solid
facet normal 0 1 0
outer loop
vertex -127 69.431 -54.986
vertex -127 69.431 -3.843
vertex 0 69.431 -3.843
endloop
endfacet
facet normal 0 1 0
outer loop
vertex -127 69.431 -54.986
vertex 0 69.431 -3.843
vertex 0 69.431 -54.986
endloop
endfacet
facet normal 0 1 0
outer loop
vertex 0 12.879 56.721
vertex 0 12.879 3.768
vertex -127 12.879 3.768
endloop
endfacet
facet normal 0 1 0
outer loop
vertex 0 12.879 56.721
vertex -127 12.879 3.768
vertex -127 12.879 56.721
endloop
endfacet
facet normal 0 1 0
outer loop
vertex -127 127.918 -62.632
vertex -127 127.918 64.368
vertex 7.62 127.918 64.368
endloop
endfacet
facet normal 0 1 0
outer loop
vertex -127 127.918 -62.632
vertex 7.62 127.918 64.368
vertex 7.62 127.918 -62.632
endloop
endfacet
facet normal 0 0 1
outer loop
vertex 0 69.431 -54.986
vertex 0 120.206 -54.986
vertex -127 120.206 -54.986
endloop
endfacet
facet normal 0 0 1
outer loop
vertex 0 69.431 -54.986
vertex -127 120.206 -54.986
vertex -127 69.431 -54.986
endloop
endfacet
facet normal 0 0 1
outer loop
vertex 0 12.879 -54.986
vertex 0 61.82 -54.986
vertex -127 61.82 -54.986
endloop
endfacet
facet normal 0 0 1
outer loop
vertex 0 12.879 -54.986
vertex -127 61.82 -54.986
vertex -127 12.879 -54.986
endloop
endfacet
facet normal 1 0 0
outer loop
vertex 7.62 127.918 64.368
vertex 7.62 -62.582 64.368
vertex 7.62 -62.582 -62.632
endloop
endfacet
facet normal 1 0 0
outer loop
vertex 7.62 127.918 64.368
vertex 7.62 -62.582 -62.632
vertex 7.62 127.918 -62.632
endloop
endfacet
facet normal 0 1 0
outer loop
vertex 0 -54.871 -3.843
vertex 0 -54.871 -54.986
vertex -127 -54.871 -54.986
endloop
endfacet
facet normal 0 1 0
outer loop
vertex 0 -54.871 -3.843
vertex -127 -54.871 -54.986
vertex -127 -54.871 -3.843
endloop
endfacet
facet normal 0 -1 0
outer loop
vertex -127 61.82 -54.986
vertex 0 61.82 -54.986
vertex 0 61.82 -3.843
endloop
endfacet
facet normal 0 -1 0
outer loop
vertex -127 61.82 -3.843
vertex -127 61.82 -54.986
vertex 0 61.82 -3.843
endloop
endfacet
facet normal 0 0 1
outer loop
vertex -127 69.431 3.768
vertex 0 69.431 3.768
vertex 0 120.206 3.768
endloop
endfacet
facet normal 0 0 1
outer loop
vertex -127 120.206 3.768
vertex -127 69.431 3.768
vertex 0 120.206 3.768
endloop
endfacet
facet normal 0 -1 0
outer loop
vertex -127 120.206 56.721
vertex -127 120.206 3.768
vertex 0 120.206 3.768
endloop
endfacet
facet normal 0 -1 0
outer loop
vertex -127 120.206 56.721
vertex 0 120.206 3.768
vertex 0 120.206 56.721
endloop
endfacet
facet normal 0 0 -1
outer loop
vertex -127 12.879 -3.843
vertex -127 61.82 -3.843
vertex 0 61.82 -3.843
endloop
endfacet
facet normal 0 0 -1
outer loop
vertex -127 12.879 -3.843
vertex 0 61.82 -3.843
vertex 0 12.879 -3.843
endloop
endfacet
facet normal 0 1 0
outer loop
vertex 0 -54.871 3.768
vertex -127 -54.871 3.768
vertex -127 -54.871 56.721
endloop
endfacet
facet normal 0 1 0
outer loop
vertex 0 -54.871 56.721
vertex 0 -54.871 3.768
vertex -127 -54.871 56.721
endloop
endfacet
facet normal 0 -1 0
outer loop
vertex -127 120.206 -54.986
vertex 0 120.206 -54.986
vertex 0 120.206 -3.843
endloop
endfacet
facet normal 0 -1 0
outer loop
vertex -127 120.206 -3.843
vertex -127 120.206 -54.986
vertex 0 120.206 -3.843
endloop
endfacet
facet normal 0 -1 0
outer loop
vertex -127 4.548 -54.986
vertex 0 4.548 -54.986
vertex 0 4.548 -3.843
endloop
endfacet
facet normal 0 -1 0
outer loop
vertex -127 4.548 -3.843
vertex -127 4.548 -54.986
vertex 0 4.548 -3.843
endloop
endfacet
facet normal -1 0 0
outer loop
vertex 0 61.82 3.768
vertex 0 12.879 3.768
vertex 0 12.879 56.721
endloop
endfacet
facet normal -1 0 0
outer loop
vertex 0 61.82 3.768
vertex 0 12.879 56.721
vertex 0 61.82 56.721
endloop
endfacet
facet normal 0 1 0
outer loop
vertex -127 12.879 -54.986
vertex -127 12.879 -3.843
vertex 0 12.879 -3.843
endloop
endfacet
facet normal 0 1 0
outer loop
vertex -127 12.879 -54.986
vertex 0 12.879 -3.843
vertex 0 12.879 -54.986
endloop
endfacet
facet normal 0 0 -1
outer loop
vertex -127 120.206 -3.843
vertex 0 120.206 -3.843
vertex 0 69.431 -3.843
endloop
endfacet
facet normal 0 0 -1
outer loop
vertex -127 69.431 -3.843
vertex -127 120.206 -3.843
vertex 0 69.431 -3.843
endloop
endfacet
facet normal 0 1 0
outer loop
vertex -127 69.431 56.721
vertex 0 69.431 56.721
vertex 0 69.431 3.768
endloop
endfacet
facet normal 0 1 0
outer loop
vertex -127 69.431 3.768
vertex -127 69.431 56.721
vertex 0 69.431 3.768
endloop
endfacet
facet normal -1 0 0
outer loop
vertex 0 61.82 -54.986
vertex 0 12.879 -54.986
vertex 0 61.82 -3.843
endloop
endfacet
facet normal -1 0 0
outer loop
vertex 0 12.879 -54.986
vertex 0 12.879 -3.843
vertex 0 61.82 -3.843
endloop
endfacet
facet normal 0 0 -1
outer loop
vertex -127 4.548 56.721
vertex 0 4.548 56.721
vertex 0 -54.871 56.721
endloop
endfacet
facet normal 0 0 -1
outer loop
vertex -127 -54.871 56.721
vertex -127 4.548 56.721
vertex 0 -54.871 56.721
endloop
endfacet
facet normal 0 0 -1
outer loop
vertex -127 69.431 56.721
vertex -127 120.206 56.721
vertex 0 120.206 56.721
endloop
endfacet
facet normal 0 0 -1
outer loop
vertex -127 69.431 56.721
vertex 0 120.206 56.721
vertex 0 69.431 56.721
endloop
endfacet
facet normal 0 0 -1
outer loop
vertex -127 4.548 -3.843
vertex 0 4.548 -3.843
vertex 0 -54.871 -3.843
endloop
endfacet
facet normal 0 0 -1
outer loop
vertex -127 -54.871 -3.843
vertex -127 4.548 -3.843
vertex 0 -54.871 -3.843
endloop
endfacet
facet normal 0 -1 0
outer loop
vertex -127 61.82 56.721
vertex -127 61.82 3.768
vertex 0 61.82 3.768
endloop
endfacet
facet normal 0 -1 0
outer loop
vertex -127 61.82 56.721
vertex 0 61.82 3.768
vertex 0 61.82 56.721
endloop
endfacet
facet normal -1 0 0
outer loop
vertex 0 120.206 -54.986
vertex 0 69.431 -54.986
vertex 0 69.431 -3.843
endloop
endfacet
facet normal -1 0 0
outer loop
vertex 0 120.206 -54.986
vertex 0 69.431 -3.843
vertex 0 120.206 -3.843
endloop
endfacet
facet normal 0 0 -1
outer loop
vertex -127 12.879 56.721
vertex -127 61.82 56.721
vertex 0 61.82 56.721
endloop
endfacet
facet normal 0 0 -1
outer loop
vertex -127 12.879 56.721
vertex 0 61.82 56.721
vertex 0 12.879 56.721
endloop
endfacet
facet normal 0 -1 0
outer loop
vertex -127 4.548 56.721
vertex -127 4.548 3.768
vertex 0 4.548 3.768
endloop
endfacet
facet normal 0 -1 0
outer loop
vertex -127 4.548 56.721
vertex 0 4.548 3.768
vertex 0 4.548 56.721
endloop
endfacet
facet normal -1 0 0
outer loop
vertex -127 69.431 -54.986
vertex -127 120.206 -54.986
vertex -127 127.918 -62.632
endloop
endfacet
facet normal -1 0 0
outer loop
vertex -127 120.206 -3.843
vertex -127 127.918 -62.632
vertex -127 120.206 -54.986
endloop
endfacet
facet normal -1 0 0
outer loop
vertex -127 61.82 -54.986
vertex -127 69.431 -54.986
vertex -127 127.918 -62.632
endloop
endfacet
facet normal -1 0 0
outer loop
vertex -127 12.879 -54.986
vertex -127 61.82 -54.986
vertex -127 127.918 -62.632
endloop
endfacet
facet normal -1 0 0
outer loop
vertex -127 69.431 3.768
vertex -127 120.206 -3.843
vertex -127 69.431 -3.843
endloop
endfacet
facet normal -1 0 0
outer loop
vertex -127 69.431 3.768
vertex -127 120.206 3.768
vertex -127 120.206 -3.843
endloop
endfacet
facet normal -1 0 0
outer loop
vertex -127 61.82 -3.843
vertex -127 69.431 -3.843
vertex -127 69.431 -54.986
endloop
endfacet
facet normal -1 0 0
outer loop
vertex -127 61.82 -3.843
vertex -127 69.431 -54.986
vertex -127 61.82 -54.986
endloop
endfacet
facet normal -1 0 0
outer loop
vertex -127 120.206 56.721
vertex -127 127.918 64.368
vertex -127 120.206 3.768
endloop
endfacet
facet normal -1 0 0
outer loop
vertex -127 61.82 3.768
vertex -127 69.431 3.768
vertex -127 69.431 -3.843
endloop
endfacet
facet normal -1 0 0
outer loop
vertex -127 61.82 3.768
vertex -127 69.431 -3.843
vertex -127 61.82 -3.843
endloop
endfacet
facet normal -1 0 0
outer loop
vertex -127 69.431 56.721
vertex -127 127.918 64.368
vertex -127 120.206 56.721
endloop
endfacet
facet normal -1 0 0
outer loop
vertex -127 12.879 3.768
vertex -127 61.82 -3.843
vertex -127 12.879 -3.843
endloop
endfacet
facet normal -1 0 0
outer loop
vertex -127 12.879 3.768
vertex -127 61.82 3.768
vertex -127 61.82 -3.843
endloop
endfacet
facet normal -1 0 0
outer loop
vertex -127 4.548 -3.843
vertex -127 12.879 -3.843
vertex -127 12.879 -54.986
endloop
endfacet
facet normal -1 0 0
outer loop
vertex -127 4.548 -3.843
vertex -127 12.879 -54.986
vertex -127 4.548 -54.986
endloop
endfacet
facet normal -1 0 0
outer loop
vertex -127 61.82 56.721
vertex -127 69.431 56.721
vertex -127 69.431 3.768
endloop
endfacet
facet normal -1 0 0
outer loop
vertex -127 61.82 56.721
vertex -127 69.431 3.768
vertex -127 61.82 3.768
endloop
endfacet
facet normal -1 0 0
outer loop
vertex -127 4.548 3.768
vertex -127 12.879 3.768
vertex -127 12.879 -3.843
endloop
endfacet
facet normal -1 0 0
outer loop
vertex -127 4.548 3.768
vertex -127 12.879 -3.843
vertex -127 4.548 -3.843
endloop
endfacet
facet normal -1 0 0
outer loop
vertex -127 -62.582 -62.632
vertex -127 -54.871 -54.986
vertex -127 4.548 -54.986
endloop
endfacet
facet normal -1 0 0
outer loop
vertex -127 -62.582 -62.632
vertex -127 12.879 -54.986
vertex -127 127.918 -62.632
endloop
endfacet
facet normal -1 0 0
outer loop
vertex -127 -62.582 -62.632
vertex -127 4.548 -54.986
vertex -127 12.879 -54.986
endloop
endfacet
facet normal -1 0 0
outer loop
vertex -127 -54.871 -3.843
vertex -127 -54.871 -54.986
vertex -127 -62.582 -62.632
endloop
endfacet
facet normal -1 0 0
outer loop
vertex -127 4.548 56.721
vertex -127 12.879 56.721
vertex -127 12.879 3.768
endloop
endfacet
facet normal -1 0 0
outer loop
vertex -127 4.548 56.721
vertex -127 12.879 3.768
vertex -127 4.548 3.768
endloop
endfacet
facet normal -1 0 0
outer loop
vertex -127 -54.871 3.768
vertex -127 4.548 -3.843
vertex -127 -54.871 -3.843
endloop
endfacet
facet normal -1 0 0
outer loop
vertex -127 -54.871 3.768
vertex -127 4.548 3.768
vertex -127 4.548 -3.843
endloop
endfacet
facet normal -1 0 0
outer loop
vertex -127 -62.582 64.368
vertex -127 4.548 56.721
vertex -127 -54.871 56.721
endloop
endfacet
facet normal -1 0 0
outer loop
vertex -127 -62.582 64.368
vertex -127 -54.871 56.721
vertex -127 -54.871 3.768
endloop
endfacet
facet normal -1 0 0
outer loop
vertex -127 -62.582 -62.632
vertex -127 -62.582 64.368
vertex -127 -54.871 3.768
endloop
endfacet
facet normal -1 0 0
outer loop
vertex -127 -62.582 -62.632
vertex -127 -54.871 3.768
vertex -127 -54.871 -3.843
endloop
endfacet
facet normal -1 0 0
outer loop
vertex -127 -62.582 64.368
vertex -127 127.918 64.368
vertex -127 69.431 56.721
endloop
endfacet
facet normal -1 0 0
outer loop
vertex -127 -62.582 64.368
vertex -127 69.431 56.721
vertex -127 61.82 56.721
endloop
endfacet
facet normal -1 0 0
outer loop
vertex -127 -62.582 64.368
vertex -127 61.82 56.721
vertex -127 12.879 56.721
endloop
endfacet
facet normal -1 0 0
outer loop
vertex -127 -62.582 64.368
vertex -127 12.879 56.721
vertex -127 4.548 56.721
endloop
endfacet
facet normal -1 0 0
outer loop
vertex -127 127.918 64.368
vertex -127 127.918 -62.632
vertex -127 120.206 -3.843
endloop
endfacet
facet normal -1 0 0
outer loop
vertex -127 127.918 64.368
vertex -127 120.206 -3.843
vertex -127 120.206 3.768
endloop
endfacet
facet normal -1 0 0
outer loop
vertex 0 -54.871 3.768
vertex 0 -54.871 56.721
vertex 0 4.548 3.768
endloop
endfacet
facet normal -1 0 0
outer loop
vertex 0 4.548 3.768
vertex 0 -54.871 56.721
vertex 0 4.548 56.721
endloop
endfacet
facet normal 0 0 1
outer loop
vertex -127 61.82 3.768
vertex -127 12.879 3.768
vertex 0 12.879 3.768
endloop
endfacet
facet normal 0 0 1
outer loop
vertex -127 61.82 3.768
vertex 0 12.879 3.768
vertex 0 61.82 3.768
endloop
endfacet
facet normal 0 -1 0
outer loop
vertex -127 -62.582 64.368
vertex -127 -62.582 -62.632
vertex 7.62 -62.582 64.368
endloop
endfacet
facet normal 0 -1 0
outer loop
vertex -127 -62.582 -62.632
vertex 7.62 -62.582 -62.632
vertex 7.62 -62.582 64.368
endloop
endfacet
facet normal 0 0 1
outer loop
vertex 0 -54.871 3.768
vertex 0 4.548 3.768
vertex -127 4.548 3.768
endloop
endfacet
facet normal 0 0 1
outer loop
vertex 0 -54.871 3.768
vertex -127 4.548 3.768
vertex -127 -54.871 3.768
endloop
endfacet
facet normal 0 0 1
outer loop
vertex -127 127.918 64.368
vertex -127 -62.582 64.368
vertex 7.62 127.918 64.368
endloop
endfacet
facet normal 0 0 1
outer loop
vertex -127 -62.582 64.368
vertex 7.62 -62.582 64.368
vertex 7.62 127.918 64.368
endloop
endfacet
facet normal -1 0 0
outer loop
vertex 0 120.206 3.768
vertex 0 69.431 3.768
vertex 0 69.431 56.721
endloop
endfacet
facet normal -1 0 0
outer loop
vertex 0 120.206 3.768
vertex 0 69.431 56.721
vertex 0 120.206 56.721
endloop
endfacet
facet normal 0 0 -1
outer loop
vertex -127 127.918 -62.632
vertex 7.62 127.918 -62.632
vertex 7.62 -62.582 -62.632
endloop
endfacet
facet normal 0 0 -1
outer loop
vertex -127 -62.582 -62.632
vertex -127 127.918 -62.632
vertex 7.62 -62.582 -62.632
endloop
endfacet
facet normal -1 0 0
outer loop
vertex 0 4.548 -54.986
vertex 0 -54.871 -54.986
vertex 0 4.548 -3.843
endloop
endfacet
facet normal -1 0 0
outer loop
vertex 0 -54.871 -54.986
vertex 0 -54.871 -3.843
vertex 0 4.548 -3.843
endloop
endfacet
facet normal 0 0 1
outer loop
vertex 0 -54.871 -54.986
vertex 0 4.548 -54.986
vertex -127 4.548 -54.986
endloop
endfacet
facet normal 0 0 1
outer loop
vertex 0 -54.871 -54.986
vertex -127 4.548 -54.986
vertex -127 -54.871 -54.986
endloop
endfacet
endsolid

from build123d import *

# Parameters (mm, degrees)
F0_W     = 190.5
F0_H     = 127
F1_DEPTH = 7.62
F2_W     = 7.7119544148
F2_H     = 7.6466050446
F2_W_2   = 175.0760897994
F2_H_2   = 111.7067933083
F2_W_3   = 7.7119557858
F2_H_3   = 7.6466016471
F3_DEPTH = 127
F4_W     = 7.6109431684
F4_H     = 52.9533312656
F4_H_2   = 7.6109394431
F4_W_2   = 48.9413635805
F4_W_3   = 8.3309542388
F4_W_4   = 59.4186419621
F5_DEPTH = 127


with BuildPart() as f1:
    # F0 (on Right) → F1 (new body)
    with BuildSketch(Plane.YZ):
        with Locations((32.6675430536, 0.8675659299)):
            Rectangle(F0_W, F0_H)
    extrude(amount=F1_DEPTH)

    # F2 (on face) → F3 (join)
    with BuildSketch(Plane(origin=(0, 0, 0), x_dir=(0, -1, 0), z_dir=(-1, 0, 0))):
        with Locations((-124.0615658462, 60.5442634076)):
            Rectangle(F2_W, F2_H)
        with Locations((-32.6675437391, 60.5442634076)):
            Rectangle(F2_W_2, F2_H)
        with Locations((-124.0615658462, 0.8675642312)):
            Rectangle(F2_W, F2_H_2)
        with Locations((58.7264790535, 60.5442634076)):
            Rectangle(F2_W_3, F2_H)
        with Locations((-124.0615658462, -58.8091332465)):
            Rectangle(F2_W, F2_H_3)
        with Locations((58.7264790535, 0.8675642312)):
            Rectangle(F2_W_3, F2_H_2)
        with Locations((-32.6675437391, -58.8091332465)):
            Rectangle(F2_W_2, F2_H_3)
        with Locations((58.7264790535, -58.8091332465)):
            Rectangle(F2_W_3, F2_H_3)
    extrude(amount=F3_DEPTH)

    # F4 (on face) → F5 (join)
    with BuildSketch(Plane(origin=(0, 0, 0), x_dir=(0, -1, 0), z_dir=(-1, 0, 0))):
        with Locations((-65.625930205, 30.2442952525)):
            Rectangle(F4_W, F4_H)
        with Locations((-65.625930205, -0.0378401019)):
            Rectangle(F4_W, F4_H_2)
        Polygon((-69.4314017892, -3.8433098234), (-69.4314017892, 3.7676296197), (-110.6796637177, 3.7676296197), (-120.2055886388, 3.7676296197), (-120.2055886388, 0), (-120.2055886388, -3.8433098234), align=None)
        Polygon((-61.8204586208, -3.8433098234), (-69.4314017892, -3.8433098234), (-69.4314017892, -24.8306896538), (-69.4314017892, -54.985832423), (-61.8204586208, -54.985832423), align=None)
        with Locations((-37.3497768305, -0.0378401019)):
            Rectangle(F4_W_2, F4_H_2)
        with Locations((-8.7136179209, -0.0378401019)):
            Rectangle(F4_W_3, F4_H_2)
        with Locations((-8.7136179209, 30.2442952525)):
            Rectangle(F4_W_3, F4_H)
        Polygon((-4.5481408015, -3.8433098234), (-12.8790950403, -3.8433098234), (-12.8790950403, -54.985832423), (-4.5481408015, -54.985832423), (-4.5481408015, -8.6574442685), align=None)
        with Locations((25.1611801796, -0.0378401019)):
            Rectangle(F4_W_4, F4_H_2)
    extrude(amount=F5_DEPTH)


solid = f1.part
